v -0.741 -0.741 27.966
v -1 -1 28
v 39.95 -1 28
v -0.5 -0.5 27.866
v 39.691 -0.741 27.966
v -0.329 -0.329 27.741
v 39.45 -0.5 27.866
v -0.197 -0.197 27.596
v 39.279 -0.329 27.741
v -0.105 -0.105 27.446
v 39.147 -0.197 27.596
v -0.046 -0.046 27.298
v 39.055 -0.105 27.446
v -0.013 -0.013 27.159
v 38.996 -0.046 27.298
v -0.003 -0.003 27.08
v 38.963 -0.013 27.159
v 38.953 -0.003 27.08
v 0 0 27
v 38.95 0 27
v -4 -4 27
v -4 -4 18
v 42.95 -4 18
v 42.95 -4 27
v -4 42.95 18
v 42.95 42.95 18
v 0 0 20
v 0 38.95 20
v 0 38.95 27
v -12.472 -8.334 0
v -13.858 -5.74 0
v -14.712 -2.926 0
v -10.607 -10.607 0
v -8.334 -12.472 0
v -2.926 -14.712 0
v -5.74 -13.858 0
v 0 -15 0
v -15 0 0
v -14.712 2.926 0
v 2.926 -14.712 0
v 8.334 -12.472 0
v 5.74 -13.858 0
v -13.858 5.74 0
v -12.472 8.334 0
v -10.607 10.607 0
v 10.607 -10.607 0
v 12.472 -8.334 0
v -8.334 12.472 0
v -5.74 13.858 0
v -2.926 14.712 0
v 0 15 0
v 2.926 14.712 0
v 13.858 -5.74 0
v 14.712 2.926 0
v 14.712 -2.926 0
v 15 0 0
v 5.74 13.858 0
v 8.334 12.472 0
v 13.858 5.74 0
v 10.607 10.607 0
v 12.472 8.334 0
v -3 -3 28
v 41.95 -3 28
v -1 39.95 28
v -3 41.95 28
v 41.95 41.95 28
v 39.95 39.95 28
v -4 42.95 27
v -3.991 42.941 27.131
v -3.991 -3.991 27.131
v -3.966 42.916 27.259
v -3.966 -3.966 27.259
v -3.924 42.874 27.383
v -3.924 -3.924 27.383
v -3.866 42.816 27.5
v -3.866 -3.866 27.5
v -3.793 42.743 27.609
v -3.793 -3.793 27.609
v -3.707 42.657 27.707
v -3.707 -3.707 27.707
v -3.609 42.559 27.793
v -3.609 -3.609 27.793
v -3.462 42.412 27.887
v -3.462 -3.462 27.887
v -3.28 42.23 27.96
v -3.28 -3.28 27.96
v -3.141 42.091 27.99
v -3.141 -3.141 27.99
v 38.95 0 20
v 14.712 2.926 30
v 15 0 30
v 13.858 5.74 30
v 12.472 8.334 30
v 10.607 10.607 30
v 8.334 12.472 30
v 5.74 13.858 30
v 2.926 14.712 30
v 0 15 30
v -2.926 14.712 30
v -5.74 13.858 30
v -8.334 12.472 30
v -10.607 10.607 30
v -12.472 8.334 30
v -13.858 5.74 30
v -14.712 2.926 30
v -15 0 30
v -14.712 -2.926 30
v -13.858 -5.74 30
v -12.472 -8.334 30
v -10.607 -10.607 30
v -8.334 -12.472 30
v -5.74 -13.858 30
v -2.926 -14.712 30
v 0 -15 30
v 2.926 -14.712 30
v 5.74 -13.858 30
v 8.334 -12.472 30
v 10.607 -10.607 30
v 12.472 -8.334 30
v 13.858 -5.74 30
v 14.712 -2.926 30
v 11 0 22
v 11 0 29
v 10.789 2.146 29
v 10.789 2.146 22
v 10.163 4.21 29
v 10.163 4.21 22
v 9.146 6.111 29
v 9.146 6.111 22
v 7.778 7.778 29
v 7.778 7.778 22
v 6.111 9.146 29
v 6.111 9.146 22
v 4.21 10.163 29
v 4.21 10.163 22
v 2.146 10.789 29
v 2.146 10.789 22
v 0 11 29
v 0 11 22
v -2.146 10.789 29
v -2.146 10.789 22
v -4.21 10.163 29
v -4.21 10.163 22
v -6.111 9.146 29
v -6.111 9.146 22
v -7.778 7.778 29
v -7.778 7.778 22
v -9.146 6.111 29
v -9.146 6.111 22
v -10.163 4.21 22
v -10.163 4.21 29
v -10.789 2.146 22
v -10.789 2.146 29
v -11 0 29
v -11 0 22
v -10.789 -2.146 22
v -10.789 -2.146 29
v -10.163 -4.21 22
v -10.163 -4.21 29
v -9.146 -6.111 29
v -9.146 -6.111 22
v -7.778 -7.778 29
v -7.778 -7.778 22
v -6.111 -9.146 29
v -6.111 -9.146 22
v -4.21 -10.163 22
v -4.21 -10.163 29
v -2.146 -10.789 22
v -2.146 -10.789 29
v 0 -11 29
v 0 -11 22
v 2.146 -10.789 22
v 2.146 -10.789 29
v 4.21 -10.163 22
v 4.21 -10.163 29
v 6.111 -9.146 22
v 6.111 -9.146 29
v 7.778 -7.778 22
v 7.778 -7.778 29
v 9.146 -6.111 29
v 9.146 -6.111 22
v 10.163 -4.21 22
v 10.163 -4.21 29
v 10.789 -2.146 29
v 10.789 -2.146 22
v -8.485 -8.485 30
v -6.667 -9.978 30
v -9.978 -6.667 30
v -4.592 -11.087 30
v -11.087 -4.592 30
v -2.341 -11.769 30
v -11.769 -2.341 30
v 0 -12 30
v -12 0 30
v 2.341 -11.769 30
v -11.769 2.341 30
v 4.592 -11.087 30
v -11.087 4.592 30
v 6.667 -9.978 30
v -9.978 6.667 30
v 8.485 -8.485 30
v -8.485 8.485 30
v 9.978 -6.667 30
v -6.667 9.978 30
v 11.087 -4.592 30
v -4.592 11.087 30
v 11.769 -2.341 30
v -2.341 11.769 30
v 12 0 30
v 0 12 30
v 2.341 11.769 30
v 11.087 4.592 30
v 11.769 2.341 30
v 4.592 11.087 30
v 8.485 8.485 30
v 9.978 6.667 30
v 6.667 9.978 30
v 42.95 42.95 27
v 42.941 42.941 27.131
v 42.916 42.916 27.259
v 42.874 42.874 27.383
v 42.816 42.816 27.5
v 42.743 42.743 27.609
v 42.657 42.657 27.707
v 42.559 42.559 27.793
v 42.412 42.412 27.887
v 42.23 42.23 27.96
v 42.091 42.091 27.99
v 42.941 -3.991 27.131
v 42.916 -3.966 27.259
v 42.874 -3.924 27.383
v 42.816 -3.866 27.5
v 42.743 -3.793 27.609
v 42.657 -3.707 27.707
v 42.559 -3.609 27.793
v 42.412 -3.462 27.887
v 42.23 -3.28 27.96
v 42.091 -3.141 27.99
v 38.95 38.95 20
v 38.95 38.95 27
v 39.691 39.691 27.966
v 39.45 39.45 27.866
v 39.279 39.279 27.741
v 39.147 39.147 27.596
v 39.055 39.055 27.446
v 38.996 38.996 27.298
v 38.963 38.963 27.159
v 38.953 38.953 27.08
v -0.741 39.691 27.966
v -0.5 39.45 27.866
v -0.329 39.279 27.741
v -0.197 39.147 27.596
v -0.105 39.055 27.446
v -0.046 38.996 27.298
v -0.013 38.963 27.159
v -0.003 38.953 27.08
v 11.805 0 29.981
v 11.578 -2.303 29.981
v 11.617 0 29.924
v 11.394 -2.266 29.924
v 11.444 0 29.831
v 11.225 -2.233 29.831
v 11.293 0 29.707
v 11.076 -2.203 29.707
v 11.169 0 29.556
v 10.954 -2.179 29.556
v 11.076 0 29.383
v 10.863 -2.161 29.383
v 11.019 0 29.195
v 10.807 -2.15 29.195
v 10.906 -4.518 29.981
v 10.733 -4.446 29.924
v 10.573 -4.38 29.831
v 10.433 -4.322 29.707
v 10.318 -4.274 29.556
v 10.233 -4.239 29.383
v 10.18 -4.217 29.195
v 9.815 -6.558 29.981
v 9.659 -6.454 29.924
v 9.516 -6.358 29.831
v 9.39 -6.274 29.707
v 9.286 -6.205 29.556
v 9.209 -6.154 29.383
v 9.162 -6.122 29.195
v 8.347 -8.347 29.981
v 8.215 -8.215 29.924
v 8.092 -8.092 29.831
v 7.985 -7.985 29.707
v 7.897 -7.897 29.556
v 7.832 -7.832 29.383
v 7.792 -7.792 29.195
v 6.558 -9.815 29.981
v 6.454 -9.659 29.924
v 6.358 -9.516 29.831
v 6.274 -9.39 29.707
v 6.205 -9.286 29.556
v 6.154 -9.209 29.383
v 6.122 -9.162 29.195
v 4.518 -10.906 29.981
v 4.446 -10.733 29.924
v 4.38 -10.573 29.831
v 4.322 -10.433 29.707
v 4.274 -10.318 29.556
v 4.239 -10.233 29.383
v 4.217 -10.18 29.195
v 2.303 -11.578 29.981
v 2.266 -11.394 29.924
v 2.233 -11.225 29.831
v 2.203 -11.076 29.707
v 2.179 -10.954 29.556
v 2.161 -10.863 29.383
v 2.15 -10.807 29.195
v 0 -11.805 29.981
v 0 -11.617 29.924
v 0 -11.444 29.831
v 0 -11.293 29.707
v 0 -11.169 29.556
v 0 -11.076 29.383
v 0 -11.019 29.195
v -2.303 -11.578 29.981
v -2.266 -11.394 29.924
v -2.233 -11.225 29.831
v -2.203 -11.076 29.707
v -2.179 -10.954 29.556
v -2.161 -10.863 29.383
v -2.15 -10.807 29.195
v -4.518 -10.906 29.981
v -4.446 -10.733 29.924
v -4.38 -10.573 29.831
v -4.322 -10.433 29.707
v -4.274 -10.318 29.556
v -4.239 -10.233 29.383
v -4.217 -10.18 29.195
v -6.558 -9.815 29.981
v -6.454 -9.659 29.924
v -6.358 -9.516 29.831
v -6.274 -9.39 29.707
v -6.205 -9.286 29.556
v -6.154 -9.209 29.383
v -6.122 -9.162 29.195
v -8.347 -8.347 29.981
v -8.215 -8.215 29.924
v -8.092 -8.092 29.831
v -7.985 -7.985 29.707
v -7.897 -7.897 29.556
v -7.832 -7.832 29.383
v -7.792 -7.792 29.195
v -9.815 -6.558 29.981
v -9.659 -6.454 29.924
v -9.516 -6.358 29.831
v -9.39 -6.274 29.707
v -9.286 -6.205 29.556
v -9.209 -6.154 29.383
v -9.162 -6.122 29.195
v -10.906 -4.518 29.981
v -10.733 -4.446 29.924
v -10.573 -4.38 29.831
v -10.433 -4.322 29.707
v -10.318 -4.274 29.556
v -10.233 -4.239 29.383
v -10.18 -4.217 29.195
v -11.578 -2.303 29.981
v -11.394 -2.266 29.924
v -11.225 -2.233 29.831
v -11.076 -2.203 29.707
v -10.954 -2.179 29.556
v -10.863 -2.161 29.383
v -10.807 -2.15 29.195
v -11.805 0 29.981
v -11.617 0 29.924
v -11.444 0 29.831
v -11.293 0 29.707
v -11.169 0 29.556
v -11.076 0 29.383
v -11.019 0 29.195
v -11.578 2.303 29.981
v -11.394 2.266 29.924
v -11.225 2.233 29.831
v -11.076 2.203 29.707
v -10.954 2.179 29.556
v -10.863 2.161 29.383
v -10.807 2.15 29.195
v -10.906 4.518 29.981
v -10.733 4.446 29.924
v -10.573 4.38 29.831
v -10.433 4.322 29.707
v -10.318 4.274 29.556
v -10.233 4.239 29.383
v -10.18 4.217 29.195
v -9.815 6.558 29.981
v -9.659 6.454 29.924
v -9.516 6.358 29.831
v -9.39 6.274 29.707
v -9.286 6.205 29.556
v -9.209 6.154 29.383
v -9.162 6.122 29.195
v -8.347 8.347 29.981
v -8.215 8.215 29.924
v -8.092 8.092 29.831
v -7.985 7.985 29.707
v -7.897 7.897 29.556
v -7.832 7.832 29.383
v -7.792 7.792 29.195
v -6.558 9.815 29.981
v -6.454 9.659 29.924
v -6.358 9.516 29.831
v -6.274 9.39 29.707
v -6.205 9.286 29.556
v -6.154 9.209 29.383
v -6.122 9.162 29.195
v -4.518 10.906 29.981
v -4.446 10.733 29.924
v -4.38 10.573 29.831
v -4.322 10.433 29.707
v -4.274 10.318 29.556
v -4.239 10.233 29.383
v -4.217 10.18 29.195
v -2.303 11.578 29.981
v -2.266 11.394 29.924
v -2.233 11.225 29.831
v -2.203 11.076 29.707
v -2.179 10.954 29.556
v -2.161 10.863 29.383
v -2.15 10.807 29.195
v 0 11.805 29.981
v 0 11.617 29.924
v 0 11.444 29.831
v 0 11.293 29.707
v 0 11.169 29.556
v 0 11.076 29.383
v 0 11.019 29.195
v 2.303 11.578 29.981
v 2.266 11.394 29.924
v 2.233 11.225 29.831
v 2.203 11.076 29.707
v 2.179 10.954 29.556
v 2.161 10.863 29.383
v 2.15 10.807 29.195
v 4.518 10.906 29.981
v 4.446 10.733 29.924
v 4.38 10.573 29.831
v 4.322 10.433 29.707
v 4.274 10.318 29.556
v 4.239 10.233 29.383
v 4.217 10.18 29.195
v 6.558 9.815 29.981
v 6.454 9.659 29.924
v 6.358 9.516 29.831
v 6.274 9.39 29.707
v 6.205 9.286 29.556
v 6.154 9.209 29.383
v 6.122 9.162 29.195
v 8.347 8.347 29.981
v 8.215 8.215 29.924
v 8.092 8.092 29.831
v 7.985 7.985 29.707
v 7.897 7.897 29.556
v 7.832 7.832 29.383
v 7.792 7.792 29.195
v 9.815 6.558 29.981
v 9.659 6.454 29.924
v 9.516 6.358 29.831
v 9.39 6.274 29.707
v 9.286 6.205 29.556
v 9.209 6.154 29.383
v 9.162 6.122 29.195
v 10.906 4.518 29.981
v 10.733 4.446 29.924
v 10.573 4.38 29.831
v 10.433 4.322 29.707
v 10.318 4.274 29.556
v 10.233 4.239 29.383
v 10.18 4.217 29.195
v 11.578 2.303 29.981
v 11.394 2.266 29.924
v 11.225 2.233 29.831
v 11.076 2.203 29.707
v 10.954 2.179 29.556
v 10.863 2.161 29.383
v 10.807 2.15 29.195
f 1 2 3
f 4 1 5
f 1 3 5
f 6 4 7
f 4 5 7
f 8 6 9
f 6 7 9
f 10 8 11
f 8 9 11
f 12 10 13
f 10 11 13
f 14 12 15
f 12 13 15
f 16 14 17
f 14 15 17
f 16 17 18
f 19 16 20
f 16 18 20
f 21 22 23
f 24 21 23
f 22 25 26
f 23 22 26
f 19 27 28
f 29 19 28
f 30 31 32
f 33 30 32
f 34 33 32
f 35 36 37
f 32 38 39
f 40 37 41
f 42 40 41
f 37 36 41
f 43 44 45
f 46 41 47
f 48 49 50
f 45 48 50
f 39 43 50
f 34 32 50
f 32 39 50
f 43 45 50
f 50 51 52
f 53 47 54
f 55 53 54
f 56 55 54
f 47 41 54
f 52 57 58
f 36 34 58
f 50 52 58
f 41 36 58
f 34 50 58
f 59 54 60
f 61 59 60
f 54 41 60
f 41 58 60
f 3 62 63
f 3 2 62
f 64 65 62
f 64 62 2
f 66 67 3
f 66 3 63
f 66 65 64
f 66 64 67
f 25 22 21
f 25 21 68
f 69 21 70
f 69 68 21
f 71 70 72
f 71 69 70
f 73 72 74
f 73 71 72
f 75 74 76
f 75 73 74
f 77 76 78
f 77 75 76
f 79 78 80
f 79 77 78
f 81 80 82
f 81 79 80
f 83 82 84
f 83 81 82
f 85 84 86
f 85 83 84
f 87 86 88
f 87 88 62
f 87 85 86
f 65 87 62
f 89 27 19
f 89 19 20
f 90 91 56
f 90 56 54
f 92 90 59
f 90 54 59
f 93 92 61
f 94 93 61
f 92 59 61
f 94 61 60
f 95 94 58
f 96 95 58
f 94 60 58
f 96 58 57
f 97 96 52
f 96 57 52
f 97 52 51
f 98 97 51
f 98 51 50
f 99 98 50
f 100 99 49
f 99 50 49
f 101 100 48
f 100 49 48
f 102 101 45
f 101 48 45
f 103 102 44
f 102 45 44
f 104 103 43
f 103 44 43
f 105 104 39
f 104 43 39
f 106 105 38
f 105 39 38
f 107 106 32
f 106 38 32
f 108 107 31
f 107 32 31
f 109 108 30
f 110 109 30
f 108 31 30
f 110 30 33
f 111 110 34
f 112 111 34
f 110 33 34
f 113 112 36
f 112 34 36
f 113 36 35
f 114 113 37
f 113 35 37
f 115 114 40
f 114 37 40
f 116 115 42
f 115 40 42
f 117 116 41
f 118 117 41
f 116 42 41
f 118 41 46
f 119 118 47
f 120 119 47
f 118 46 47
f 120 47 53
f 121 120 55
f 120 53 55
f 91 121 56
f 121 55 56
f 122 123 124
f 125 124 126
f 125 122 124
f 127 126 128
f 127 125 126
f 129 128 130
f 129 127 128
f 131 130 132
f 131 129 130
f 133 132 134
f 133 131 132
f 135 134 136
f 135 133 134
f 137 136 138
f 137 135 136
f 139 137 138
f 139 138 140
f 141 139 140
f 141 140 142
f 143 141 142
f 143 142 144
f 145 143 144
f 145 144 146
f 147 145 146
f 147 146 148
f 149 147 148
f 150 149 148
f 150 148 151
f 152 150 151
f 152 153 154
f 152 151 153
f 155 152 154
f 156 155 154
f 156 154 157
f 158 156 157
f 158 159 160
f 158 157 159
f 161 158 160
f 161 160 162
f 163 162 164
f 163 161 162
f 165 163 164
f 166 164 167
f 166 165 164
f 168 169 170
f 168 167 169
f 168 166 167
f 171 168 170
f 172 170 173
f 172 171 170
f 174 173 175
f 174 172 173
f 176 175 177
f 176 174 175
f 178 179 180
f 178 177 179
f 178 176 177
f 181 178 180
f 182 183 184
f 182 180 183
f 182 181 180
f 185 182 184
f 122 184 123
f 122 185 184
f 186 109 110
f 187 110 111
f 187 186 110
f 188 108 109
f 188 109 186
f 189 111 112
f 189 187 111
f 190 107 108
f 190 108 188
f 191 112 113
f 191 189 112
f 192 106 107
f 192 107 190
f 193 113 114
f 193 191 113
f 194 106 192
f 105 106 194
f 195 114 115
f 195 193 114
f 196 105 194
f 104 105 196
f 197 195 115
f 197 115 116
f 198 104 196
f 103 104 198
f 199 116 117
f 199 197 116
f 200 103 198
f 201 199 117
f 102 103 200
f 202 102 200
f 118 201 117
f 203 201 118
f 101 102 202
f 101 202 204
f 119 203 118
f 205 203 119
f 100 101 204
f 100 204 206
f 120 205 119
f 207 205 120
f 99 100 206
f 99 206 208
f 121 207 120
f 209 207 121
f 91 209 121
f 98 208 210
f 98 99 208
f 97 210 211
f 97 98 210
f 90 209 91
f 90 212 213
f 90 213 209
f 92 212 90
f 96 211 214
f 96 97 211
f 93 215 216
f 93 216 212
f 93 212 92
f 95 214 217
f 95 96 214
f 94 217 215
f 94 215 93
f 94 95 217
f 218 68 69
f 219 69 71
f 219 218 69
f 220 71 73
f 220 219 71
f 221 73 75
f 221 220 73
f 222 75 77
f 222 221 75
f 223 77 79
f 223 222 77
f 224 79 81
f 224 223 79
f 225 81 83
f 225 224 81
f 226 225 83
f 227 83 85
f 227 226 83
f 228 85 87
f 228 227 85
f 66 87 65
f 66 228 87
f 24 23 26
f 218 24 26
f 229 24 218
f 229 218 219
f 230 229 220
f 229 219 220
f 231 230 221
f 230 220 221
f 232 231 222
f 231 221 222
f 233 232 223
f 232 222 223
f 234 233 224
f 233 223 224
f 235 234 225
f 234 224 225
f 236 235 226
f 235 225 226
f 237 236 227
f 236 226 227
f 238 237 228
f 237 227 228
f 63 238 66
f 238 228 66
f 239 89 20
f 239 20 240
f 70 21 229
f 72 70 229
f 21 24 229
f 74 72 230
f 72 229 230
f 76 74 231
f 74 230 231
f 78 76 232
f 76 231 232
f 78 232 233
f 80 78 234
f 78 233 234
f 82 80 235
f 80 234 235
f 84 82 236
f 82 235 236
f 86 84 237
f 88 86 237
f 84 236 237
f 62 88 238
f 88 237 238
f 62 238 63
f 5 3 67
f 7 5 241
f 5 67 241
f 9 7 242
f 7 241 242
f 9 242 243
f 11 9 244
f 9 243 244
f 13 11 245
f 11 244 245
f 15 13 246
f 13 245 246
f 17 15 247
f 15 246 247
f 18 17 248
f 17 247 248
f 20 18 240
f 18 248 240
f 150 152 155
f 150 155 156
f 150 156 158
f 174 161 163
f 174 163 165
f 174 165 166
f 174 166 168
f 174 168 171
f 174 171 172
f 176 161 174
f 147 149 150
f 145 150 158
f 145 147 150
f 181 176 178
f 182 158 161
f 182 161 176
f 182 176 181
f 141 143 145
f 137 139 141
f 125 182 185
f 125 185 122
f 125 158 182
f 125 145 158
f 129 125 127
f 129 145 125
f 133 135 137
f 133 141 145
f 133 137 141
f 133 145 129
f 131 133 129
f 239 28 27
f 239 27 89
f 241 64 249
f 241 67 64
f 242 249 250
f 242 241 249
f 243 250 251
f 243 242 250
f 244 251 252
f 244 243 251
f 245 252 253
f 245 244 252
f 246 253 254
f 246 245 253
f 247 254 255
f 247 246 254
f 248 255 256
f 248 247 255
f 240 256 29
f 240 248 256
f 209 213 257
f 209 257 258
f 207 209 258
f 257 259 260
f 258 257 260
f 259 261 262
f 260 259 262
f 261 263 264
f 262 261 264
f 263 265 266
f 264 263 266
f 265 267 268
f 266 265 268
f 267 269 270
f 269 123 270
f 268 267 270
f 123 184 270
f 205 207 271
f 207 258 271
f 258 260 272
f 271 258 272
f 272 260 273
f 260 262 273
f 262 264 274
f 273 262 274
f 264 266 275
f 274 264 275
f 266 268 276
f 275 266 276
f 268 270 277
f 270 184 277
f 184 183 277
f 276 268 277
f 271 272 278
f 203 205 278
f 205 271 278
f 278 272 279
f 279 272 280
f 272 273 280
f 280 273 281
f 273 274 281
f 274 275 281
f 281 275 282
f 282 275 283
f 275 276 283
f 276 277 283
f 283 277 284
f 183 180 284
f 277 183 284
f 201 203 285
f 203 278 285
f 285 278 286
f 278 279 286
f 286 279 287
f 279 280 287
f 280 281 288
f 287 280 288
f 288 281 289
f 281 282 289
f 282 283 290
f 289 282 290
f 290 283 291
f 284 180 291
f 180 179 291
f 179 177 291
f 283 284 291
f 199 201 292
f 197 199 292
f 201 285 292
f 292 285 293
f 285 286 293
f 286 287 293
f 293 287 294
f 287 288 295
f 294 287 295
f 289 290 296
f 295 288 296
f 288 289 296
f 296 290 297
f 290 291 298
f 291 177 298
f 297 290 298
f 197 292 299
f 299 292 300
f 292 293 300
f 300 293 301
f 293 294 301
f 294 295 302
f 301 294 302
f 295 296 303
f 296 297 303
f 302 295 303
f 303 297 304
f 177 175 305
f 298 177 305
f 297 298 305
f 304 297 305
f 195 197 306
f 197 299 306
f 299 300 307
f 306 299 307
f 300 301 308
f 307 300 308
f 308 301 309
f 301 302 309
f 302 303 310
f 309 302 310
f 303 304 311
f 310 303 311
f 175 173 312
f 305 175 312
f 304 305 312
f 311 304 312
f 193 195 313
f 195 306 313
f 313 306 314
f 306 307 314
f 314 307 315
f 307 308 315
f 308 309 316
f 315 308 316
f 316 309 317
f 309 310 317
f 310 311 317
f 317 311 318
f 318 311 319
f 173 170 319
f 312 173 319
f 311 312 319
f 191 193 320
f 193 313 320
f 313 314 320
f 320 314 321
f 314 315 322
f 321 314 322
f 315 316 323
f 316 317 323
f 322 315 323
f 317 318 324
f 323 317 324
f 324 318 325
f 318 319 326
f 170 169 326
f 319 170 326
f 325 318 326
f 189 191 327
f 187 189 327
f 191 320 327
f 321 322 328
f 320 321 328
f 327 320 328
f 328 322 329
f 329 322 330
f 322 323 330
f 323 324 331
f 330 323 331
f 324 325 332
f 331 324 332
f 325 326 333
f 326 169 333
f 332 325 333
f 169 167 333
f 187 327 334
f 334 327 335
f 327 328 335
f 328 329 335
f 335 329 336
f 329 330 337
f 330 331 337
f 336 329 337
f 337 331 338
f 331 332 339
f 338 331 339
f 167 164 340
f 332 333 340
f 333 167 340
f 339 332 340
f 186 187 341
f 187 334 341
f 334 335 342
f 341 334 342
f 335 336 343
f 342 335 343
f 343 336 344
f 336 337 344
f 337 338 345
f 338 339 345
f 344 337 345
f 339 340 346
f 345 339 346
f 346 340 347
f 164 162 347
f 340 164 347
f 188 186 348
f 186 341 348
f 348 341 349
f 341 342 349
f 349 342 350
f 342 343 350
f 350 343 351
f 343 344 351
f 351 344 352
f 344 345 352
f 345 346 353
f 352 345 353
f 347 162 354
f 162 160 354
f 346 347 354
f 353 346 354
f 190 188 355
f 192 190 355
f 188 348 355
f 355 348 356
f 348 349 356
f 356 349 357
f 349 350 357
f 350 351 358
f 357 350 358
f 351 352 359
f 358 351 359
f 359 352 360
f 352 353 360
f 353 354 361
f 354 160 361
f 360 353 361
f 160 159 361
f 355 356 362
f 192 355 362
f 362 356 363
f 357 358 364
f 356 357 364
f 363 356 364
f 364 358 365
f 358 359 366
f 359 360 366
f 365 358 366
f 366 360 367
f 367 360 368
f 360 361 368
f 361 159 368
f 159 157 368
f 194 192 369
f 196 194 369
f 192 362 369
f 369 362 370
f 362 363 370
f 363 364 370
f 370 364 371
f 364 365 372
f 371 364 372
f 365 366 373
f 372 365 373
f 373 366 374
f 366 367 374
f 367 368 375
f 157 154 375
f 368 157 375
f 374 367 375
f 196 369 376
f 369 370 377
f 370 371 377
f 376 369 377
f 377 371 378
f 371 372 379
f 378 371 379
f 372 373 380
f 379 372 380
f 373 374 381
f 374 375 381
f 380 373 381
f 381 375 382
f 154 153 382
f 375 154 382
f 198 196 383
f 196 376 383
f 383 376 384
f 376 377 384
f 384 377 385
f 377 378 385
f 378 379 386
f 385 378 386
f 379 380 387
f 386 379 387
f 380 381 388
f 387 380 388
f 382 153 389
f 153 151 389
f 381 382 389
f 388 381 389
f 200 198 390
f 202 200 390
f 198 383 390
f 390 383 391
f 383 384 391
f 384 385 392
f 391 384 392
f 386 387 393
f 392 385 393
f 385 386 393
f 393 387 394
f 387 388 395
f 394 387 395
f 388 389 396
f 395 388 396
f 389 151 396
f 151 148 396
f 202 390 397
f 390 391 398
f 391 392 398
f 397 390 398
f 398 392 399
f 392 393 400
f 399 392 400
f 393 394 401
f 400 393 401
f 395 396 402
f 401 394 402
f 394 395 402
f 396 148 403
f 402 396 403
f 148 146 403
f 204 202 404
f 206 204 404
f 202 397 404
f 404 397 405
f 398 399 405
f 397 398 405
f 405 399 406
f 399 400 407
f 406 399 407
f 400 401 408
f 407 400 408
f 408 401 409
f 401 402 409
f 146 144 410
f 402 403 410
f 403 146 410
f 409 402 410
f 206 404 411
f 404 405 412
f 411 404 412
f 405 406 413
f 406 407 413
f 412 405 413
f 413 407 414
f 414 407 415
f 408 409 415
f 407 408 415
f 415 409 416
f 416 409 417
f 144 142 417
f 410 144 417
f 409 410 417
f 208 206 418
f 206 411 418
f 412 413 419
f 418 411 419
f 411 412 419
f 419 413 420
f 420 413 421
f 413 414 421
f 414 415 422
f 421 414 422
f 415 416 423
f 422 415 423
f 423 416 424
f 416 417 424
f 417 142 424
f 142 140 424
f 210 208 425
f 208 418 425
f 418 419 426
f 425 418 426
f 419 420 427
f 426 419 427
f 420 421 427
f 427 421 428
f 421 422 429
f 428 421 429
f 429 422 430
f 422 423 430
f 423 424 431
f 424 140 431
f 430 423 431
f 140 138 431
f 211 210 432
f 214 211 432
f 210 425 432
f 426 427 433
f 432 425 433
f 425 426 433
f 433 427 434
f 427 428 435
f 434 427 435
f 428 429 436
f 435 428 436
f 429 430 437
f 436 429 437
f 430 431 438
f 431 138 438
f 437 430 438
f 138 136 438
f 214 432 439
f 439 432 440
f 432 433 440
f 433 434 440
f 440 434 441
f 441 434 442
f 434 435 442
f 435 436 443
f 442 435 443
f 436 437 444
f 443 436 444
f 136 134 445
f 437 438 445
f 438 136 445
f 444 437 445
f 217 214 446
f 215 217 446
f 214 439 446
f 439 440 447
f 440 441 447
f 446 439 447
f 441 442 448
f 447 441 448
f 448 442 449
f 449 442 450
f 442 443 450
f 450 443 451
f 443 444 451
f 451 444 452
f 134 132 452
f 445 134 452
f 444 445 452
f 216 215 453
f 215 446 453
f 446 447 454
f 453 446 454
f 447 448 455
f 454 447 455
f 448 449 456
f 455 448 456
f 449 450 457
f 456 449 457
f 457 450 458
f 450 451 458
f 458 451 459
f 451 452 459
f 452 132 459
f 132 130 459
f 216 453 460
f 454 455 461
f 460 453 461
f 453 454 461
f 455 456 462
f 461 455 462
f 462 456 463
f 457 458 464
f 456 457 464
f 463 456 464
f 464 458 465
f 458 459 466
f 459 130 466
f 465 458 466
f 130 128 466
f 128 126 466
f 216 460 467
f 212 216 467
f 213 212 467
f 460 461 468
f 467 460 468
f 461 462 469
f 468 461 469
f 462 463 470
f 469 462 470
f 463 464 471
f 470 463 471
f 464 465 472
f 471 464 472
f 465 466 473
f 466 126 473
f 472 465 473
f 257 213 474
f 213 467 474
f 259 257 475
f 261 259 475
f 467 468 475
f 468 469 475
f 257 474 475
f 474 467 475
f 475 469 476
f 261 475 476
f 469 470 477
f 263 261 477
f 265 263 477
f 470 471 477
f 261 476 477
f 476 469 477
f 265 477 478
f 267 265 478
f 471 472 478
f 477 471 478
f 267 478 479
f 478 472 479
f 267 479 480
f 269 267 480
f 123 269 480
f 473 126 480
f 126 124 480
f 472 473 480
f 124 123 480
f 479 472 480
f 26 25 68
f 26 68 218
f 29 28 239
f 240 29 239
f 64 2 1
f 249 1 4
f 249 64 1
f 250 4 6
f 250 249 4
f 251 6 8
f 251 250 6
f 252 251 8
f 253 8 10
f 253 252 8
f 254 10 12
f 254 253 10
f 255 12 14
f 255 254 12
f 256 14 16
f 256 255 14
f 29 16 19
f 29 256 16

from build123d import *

# Parameters (mm, degrees)
SKETCH_W        = 46.95
SKETCH_H        = 46.95
SKETCH_W_2      = 38.95
SKETCH_H_2      = 38.95
PAD_DEPTH       = 28
SKETCH001_W     = 38.95
SKETCH001_H     = 38.95
PAD001_DEPTH    = 20
FILLET_R        = 1
SKETCH002_R     = 74.3428
POCKET_DEPTH    = 18
SKETCH003_R     = 15
PAD002_DEPTH    = 30
SKETCH004_R     = 11
POCKET001_DEPTH = 8.001
FILLET001_R     = 1


with BuildPart() as body:
    # Sketch → Pad (new body)
    with BuildSketch(Plane.XY):
        with Locations((19.475, 19.475)):
            Rectangle(SKETCH_W, SKETCH_H)
        with Locations((19.475, 19.475)):
            Rectangle(SKETCH_W_2, SKETCH_H_2, mode=Mode.SUBTRACT)
    extrude(amount=PAD_DEPTH)

    # Sketch001 → Pad001 (join)
    with BuildSketch(Plane.XY):
        with Locations((19.475, 19.475)):
            Rectangle(SKETCH001_W, SKETCH001_H)
    extrude(amount=PAD001_DEPTH)

    # Fillet
    fillet_edges = [body.edges().sort_by_distance(p)[0] for p in [
        (19.475, 42.95, 28),
        (42.95, 19.475, 28),
        (19.475, -4, 28),
        (-4, 19.475, 28),
        (19.475, 0, 28),
        (38.95, 19.475, 28),
        (19.475, 38.95, 28),
        (0, 19.475, 28),
    ]]
    fillet(fillet_edges, radius=FILLET_R)

    # Sketch002 → Pocket (cut)
    with BuildSketch(Plane.XY):
        with Locations((-5.043797, 44.418015)):
            Circle(SKETCH002_R)
    extrude(amount=POCKET_DEPTH, mode=Mode.SUBTRACT)


with BuildPart() as body001shelfcenter:
    # Sketch003 → Pad002 (new body)
    with BuildSketch(Plane.XY):
        Circle(SKETCH003_R)
    extrude(amount=PAD002_DEPTH)

    # Sketch004 → Pocket001 (cut, through all)
    with BuildSketch(Plane.XY.offset(22)):
        Circle(SKETCH004_R)
    extrude(amount=POCKET001_DEPTH, mode=Mode.SUBTRACT)

    # Fillet001
    fillet001_edges = [body001shelfcenter.edges().sort_by_distance(p)[0] for p in [
        (-11, 0, 30),
    ]]
    fillet(fillet001_edges, radius=FILLET001_R)


solid = Compound([body.part, body001shelfcenter.part])
